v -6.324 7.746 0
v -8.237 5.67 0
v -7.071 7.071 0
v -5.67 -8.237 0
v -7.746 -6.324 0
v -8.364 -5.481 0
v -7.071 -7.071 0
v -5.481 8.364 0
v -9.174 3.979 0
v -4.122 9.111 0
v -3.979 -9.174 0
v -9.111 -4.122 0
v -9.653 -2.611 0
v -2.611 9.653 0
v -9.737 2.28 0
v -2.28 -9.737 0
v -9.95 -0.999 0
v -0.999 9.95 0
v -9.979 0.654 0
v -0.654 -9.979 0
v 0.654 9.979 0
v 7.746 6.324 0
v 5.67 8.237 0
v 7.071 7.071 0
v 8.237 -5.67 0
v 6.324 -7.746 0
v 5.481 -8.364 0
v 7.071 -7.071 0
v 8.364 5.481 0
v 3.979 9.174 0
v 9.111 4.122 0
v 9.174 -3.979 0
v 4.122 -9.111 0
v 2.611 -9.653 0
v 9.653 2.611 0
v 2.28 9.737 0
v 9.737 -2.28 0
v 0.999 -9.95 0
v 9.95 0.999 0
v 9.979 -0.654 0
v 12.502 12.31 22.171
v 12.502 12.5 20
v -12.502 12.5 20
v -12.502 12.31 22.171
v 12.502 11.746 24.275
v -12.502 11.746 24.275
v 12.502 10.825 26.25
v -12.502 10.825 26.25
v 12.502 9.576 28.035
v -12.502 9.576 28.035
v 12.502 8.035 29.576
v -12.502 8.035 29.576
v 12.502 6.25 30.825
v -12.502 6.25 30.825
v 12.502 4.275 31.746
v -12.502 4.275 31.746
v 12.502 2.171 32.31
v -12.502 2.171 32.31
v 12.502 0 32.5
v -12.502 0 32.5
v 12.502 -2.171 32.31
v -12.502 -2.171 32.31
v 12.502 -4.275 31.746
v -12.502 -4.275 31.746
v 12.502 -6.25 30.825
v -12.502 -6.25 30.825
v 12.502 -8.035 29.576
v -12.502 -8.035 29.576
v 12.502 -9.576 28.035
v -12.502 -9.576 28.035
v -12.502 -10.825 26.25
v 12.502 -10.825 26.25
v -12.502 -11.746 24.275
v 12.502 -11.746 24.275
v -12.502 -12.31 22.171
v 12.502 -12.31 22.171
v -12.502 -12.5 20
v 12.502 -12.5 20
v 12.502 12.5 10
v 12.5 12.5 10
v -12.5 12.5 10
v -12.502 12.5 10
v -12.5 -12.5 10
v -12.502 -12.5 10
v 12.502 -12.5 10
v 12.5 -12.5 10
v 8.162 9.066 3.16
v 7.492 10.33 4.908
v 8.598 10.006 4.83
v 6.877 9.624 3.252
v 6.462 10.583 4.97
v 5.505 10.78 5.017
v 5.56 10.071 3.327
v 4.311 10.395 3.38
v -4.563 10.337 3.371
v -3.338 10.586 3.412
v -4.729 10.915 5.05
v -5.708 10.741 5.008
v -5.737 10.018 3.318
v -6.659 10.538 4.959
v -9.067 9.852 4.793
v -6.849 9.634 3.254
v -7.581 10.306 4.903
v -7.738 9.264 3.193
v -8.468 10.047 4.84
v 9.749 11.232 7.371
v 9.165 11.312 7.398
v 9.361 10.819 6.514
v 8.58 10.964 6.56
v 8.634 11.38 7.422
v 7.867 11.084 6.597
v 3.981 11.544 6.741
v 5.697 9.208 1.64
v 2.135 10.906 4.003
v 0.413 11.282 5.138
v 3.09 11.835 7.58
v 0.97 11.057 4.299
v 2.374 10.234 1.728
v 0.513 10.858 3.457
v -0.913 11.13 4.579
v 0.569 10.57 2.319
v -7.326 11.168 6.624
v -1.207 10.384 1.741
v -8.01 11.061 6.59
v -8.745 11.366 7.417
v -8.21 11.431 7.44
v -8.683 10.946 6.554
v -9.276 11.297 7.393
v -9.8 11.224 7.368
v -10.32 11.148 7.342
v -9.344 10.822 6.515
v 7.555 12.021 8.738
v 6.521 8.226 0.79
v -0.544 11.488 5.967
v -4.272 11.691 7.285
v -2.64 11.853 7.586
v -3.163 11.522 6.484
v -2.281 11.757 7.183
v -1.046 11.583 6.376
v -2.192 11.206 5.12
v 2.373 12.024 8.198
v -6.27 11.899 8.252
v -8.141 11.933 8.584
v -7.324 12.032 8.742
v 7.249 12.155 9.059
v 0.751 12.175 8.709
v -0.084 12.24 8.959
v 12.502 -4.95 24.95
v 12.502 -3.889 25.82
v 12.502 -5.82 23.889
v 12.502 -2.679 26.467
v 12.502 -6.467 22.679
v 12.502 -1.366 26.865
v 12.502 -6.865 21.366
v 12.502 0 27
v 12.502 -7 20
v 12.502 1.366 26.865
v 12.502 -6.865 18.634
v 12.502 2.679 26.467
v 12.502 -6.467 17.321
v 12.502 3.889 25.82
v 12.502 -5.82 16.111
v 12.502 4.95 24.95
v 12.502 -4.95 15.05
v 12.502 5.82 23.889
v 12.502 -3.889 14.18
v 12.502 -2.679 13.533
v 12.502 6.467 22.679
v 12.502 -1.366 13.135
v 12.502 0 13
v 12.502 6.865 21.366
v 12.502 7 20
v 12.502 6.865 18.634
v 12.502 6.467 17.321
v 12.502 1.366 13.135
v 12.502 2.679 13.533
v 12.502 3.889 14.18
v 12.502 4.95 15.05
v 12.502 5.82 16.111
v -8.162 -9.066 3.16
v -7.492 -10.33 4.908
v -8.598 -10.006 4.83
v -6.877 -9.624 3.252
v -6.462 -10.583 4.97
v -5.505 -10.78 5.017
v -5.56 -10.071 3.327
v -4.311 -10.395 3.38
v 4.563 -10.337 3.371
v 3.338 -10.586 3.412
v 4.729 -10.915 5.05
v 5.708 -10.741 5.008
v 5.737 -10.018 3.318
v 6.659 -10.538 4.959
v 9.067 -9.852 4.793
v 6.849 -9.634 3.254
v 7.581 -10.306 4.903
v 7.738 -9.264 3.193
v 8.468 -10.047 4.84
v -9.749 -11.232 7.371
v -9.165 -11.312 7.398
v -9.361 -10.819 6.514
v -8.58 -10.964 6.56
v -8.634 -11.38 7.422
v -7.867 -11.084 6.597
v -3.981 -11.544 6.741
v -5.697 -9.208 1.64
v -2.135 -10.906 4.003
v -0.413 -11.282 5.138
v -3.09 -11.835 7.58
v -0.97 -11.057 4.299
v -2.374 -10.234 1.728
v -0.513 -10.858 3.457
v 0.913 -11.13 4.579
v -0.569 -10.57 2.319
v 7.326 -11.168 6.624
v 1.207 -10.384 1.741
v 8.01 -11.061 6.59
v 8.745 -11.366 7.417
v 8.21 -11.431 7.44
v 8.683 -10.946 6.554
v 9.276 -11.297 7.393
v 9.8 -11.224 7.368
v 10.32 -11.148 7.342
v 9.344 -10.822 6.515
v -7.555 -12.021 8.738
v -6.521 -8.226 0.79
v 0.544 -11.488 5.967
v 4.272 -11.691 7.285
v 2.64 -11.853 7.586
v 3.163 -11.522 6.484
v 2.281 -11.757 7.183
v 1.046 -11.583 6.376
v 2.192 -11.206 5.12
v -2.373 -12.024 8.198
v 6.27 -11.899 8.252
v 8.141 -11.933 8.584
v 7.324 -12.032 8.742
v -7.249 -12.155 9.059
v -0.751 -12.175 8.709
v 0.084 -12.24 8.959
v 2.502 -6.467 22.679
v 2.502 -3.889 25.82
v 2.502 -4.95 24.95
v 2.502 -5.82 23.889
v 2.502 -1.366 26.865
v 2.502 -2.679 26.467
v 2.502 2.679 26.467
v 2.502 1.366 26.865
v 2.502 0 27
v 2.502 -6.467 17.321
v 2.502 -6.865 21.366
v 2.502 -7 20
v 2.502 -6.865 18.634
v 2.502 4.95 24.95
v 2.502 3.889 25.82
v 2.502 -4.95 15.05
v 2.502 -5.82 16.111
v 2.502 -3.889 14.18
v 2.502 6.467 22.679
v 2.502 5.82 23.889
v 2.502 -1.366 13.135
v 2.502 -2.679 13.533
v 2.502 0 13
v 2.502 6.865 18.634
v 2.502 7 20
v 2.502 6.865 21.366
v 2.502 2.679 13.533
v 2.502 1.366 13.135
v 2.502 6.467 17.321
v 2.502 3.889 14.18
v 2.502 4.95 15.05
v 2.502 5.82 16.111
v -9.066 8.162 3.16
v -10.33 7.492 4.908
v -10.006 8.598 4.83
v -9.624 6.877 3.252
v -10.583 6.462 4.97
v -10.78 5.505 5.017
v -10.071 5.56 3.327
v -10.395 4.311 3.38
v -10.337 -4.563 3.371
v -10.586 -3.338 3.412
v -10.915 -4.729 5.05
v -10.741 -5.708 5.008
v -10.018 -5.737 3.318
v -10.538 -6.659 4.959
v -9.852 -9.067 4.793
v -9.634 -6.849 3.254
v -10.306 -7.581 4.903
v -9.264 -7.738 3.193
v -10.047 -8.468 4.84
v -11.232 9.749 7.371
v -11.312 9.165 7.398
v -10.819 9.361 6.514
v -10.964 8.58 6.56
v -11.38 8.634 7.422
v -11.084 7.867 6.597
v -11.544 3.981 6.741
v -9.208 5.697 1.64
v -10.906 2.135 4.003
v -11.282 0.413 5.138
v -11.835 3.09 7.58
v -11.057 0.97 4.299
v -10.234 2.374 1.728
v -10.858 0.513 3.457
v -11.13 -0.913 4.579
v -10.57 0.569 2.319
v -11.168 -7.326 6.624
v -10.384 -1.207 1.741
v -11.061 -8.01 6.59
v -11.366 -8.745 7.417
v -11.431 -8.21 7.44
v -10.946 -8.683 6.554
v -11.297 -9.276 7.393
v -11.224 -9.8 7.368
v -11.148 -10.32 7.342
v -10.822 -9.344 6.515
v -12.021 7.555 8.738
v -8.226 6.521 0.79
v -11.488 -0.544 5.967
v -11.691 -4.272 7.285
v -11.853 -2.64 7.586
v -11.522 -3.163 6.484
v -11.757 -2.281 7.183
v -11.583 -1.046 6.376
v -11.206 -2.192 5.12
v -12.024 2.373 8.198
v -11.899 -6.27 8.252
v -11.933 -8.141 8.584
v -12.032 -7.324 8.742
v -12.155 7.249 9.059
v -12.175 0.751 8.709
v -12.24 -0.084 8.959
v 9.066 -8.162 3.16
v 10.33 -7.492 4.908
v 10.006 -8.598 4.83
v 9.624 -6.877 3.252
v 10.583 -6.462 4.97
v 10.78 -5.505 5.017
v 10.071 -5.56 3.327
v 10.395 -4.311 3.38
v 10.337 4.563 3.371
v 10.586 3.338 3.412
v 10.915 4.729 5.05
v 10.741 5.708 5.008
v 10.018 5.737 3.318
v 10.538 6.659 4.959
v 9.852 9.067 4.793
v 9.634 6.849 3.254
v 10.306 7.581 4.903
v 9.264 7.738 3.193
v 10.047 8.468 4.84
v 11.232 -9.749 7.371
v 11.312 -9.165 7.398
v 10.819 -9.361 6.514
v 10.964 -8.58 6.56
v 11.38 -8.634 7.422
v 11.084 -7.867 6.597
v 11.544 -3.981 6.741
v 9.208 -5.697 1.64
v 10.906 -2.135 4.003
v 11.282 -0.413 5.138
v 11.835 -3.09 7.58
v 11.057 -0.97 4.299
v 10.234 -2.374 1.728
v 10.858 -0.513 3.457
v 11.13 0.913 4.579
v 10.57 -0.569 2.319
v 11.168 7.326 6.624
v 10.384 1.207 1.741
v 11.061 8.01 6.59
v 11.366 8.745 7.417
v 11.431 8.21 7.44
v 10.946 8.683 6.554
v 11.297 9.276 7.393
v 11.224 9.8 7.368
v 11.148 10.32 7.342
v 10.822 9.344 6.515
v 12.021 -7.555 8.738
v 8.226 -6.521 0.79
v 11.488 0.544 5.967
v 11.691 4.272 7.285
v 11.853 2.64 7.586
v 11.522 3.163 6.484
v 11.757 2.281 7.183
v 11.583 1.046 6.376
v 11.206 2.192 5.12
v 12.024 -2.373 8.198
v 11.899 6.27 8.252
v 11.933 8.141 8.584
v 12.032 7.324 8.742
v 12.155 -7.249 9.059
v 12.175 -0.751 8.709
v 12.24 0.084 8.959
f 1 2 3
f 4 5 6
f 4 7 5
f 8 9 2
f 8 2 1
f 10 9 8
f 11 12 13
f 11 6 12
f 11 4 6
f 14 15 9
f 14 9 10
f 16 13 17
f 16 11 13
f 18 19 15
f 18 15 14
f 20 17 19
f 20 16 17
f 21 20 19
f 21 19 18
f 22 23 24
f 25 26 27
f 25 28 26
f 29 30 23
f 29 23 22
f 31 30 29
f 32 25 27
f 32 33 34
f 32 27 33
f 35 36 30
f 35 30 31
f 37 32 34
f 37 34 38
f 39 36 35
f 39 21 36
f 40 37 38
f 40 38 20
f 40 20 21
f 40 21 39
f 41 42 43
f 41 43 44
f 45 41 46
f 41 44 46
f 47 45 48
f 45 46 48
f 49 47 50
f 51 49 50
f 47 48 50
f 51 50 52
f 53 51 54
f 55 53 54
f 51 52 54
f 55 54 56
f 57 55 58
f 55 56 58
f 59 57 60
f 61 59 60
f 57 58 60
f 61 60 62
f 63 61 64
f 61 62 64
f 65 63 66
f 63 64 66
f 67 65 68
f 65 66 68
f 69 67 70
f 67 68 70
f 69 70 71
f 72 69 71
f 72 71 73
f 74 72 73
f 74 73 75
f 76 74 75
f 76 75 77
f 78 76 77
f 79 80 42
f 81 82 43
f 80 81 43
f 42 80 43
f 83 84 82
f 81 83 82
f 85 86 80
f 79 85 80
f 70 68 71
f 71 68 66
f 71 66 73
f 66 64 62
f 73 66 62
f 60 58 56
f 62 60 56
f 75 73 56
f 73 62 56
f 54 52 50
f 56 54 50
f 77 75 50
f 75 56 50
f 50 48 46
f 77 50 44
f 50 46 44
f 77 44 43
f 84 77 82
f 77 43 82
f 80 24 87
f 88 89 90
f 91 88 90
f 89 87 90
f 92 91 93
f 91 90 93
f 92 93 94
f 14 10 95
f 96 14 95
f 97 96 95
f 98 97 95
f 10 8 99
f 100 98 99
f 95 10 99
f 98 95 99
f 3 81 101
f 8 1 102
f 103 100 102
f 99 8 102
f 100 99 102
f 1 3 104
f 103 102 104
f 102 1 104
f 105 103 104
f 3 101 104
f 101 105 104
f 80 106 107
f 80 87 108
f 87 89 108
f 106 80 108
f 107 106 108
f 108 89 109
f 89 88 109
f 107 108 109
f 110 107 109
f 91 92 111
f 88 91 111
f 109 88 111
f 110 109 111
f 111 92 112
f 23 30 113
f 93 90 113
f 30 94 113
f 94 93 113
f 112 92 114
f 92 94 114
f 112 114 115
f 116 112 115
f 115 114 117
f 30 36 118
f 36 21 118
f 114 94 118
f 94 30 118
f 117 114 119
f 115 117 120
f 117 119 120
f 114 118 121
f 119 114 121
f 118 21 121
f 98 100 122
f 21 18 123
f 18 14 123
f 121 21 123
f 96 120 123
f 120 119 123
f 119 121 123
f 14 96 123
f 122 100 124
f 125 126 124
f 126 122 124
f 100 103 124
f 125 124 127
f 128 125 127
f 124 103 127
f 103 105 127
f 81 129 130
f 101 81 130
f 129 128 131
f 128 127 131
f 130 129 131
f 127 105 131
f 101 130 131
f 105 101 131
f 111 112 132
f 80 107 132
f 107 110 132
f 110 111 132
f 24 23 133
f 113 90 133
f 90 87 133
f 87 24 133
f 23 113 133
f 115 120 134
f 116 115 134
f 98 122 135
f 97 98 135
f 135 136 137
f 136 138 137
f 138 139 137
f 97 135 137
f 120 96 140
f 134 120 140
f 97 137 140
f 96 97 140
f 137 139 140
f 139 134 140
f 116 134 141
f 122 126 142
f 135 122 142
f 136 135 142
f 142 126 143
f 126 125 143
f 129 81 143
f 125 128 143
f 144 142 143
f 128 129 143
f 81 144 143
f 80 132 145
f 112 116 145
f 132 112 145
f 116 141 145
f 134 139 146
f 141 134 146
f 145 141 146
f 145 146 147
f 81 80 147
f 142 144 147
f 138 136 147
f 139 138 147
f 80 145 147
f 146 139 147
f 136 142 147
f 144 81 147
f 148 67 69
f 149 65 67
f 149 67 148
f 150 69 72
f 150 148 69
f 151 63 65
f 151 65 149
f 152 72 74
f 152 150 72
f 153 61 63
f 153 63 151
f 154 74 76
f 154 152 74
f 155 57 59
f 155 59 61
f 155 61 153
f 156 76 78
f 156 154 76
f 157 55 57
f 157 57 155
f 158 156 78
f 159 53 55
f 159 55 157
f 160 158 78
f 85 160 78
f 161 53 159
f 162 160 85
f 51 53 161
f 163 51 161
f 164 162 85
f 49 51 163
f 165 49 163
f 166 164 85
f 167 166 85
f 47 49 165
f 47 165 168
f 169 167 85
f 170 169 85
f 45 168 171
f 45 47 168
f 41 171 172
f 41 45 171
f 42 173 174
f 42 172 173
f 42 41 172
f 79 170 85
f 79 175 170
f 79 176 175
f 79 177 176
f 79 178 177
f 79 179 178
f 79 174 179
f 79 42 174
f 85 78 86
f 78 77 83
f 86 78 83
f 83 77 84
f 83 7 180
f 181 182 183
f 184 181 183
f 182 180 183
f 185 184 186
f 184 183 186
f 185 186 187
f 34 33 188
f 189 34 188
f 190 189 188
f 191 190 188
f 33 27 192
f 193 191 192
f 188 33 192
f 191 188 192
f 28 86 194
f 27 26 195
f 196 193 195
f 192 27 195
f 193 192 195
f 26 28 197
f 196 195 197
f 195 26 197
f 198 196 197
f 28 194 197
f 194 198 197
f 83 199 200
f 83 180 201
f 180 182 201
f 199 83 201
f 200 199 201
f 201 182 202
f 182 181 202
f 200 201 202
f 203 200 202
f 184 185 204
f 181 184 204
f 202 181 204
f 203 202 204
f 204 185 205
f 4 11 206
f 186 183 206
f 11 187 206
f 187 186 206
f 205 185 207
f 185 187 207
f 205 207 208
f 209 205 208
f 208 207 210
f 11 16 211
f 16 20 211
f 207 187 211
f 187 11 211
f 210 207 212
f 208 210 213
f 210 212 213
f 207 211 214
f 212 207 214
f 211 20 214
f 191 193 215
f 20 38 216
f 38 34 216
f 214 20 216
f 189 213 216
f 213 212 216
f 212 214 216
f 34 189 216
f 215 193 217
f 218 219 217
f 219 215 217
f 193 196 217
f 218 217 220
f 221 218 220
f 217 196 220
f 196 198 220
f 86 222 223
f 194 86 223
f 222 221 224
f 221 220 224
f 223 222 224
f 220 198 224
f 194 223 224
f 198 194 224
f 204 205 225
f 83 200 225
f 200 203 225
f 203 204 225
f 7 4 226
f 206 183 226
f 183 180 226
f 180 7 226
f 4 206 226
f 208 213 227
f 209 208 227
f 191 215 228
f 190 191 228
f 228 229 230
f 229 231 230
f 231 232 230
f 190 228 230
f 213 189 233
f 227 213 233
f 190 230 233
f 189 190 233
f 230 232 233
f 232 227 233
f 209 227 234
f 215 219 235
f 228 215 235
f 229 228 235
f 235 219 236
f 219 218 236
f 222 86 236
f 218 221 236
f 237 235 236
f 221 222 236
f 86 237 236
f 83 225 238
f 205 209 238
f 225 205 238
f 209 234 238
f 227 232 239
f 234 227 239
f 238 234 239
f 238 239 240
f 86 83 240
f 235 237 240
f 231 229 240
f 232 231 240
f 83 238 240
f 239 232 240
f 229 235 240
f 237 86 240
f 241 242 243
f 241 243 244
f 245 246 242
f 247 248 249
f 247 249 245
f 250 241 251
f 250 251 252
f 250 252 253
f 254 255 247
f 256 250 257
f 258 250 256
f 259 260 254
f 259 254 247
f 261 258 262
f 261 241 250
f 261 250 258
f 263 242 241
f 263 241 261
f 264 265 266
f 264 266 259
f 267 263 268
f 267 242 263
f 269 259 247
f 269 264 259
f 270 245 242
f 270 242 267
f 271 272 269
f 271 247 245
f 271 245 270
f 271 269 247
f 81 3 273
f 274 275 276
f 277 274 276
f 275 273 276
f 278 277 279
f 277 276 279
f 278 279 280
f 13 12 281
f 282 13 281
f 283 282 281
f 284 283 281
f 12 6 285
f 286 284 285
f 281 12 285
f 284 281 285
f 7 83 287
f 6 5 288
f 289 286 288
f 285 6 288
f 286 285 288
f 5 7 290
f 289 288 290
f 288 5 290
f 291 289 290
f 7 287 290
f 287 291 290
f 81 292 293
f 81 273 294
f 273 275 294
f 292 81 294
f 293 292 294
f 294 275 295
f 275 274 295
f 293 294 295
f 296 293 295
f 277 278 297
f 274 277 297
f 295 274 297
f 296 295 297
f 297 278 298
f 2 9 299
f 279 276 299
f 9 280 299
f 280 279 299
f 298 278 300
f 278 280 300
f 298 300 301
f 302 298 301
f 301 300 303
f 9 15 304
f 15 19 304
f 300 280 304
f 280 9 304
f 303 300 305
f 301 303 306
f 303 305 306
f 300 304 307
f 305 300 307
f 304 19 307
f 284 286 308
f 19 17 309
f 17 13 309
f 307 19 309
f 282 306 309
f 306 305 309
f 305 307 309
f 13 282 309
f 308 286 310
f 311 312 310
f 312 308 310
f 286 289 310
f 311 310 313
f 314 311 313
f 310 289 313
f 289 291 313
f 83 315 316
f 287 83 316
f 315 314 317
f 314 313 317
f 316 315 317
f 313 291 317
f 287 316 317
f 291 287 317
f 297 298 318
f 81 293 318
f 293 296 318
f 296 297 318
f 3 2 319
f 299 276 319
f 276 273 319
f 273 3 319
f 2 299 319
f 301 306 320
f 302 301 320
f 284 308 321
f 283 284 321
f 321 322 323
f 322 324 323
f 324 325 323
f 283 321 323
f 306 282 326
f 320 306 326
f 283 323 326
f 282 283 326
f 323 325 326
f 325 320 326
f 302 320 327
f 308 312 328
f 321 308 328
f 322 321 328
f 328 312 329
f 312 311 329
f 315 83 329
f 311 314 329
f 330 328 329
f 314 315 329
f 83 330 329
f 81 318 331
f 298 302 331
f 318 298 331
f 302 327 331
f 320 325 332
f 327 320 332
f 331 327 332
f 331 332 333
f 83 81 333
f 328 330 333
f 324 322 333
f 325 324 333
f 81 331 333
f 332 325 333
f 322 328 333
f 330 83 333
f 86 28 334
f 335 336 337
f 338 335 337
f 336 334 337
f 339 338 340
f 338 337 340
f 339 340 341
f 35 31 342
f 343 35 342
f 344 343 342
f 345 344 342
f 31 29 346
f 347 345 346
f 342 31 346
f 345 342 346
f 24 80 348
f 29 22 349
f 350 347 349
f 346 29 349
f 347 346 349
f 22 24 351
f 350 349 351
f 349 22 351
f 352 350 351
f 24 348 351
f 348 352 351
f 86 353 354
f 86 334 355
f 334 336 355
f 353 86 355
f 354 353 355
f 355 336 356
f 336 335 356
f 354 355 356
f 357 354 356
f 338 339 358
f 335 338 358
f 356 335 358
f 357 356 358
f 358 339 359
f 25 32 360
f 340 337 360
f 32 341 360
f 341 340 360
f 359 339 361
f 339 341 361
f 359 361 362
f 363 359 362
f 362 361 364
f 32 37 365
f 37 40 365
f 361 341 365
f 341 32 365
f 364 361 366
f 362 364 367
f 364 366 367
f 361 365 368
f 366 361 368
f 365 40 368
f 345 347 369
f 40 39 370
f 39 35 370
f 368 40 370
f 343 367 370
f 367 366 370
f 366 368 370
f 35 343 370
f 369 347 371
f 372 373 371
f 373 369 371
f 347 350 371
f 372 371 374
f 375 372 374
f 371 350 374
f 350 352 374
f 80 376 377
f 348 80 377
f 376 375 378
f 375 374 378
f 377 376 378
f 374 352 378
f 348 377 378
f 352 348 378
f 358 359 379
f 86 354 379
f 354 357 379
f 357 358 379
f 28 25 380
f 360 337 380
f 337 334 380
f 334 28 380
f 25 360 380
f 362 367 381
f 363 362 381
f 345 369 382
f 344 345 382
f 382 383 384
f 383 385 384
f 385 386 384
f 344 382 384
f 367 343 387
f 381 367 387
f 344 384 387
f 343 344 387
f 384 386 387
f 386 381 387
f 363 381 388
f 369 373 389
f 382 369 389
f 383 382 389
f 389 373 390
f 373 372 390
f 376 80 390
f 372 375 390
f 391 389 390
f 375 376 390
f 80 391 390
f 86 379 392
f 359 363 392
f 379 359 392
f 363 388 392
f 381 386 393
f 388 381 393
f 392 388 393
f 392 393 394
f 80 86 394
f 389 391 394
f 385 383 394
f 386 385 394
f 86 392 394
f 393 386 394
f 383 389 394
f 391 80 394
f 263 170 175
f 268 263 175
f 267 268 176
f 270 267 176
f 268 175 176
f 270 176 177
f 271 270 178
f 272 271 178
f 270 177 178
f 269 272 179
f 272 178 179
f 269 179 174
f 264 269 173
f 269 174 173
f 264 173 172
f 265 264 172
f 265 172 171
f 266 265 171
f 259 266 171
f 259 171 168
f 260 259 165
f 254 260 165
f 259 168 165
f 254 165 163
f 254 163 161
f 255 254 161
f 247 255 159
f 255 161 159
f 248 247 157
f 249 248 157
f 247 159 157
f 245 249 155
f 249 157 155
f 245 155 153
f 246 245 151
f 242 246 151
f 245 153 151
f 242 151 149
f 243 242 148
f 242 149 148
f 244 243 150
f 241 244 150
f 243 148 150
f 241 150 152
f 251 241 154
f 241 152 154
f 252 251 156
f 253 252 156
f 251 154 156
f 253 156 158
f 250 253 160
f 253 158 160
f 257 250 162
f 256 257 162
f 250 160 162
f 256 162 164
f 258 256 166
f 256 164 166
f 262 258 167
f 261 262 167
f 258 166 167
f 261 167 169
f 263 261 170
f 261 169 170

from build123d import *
from OCP.BRepAlgoAPI import BRepAlgoAPI_Cut
from OCP.TopTools import TopTools_ListOfShape

# Parameters (mm, degrees)
BOSS_EXTRUDE1_START = -12.501686
BOSS_EXTRUDE1_DEPTH = 25.003372
SKETCH4_R           = 7
CUT_EXTRUDE1_DEPTH  = 10


with BuildPart() as part:
    # Sketch2 → Loft1 section 0
    with BuildSketch(Plane.XY.offset(10)):
        with BuildLine():
            Line((-12.5, -12.5), (12.5, -12.5))
            Line((12.5, -12.5), (12.5, 12.5))
            Line((12.5, 12.5), (-12.5, 12.5))
            Line((-12.5, 12.5), (-12.5, -12.5))
        make_face()
    # Sketch1 for Loft1 → Loft1 section 1
    with BuildSketch(Plane.XY):
        with BuildLine():
            # circular arc as an exact rational Bezier (weights 1, cos(half-angle), 1)
            Bezier((-7.071067812, -7.071067812), (0, -14.142135623), (7.071067812, -7.071067812), weights=[1, 0.707106781, 1])
            Bezier((7.071067812, -7.071067812), (14.142135623, 0), (7.071067812, 7.071067812), weights=[1, 0.707106781, 1])
            Bezier((7.071067812, 7.071067812), (0, 14.142135623), (-7.071067812, 7.071067812), weights=[1, 0.707106781, 1])
            Bezier((-7.071067812, 7.071067812), (-14.142135623, 0), (-7.071067812, -7.071067812), weights=[1, 0.707106781, 1])
        make_face()
    loft()

    # Sketch3 → Boss-Extrude1 (add)
    with BuildSketch(Plane(origin=(0, 0, 0), x_dir=(0, 0, -1), z_dir=(1, 0, 0)).offset(BOSS_EXTRUDE1_START)):
        with BuildLine():
            Line((-10, 12.5), (-20, 12.5))
            ThreePointArc((-20, 12.5), (-32.5, 0), (-20, -12.5))
            Line((-20, -12.5), (-10, -12.5))
            Line((-10, -12.5), (-10, 12.5))
        make_face()
    extrude(amount=BOSS_EXTRUDE1_DEPTH)


with BuildPart() as cut_extrude1_tool:
    # Sketch4 → Cut-Extrude1 (new body)
    with BuildSketch(Plane(origin=(12.501685601, 0, 0), x_dir=(0, 0, -1), z_dir=(1, 0, 0))):
        with Locations((-20, 0)):
            Circle(SKETCH4_R)
    extrude(amount=-CUT_EXTRUDE1_DEPTH)


with BuildPart() as part_1:
    add(part.part)

    # Cut-Extrude1: cut by cut_extrude1_tool, with a tolerance
    cut_extrude1_stock = TopTools_ListOfShape()
    cut_extrude1_stock.Append(part_1.part.wrapped)
    cut_extrude1_tools = TopTools_ListOfShape()
    cut_extrude1_tools.Append(cut_extrude1_tool.part.wrapped)
    cut_extrude1_cut = BRepAlgoAPI_Cut()
    cut_extrude1_cut.SetArguments(cut_extrude1_stock)
    cut_extrude1_cut.SetTools(cut_extrude1_tools)
    cut_extrude1_cut.SetFuzzyValue(0.00001)
    cut_extrude1_cut.Build()
    add(Compound.cast(cut_extrude1_cut.Shape()).solids(), mode=Mode.REPLACE)


solid = part_1.part
